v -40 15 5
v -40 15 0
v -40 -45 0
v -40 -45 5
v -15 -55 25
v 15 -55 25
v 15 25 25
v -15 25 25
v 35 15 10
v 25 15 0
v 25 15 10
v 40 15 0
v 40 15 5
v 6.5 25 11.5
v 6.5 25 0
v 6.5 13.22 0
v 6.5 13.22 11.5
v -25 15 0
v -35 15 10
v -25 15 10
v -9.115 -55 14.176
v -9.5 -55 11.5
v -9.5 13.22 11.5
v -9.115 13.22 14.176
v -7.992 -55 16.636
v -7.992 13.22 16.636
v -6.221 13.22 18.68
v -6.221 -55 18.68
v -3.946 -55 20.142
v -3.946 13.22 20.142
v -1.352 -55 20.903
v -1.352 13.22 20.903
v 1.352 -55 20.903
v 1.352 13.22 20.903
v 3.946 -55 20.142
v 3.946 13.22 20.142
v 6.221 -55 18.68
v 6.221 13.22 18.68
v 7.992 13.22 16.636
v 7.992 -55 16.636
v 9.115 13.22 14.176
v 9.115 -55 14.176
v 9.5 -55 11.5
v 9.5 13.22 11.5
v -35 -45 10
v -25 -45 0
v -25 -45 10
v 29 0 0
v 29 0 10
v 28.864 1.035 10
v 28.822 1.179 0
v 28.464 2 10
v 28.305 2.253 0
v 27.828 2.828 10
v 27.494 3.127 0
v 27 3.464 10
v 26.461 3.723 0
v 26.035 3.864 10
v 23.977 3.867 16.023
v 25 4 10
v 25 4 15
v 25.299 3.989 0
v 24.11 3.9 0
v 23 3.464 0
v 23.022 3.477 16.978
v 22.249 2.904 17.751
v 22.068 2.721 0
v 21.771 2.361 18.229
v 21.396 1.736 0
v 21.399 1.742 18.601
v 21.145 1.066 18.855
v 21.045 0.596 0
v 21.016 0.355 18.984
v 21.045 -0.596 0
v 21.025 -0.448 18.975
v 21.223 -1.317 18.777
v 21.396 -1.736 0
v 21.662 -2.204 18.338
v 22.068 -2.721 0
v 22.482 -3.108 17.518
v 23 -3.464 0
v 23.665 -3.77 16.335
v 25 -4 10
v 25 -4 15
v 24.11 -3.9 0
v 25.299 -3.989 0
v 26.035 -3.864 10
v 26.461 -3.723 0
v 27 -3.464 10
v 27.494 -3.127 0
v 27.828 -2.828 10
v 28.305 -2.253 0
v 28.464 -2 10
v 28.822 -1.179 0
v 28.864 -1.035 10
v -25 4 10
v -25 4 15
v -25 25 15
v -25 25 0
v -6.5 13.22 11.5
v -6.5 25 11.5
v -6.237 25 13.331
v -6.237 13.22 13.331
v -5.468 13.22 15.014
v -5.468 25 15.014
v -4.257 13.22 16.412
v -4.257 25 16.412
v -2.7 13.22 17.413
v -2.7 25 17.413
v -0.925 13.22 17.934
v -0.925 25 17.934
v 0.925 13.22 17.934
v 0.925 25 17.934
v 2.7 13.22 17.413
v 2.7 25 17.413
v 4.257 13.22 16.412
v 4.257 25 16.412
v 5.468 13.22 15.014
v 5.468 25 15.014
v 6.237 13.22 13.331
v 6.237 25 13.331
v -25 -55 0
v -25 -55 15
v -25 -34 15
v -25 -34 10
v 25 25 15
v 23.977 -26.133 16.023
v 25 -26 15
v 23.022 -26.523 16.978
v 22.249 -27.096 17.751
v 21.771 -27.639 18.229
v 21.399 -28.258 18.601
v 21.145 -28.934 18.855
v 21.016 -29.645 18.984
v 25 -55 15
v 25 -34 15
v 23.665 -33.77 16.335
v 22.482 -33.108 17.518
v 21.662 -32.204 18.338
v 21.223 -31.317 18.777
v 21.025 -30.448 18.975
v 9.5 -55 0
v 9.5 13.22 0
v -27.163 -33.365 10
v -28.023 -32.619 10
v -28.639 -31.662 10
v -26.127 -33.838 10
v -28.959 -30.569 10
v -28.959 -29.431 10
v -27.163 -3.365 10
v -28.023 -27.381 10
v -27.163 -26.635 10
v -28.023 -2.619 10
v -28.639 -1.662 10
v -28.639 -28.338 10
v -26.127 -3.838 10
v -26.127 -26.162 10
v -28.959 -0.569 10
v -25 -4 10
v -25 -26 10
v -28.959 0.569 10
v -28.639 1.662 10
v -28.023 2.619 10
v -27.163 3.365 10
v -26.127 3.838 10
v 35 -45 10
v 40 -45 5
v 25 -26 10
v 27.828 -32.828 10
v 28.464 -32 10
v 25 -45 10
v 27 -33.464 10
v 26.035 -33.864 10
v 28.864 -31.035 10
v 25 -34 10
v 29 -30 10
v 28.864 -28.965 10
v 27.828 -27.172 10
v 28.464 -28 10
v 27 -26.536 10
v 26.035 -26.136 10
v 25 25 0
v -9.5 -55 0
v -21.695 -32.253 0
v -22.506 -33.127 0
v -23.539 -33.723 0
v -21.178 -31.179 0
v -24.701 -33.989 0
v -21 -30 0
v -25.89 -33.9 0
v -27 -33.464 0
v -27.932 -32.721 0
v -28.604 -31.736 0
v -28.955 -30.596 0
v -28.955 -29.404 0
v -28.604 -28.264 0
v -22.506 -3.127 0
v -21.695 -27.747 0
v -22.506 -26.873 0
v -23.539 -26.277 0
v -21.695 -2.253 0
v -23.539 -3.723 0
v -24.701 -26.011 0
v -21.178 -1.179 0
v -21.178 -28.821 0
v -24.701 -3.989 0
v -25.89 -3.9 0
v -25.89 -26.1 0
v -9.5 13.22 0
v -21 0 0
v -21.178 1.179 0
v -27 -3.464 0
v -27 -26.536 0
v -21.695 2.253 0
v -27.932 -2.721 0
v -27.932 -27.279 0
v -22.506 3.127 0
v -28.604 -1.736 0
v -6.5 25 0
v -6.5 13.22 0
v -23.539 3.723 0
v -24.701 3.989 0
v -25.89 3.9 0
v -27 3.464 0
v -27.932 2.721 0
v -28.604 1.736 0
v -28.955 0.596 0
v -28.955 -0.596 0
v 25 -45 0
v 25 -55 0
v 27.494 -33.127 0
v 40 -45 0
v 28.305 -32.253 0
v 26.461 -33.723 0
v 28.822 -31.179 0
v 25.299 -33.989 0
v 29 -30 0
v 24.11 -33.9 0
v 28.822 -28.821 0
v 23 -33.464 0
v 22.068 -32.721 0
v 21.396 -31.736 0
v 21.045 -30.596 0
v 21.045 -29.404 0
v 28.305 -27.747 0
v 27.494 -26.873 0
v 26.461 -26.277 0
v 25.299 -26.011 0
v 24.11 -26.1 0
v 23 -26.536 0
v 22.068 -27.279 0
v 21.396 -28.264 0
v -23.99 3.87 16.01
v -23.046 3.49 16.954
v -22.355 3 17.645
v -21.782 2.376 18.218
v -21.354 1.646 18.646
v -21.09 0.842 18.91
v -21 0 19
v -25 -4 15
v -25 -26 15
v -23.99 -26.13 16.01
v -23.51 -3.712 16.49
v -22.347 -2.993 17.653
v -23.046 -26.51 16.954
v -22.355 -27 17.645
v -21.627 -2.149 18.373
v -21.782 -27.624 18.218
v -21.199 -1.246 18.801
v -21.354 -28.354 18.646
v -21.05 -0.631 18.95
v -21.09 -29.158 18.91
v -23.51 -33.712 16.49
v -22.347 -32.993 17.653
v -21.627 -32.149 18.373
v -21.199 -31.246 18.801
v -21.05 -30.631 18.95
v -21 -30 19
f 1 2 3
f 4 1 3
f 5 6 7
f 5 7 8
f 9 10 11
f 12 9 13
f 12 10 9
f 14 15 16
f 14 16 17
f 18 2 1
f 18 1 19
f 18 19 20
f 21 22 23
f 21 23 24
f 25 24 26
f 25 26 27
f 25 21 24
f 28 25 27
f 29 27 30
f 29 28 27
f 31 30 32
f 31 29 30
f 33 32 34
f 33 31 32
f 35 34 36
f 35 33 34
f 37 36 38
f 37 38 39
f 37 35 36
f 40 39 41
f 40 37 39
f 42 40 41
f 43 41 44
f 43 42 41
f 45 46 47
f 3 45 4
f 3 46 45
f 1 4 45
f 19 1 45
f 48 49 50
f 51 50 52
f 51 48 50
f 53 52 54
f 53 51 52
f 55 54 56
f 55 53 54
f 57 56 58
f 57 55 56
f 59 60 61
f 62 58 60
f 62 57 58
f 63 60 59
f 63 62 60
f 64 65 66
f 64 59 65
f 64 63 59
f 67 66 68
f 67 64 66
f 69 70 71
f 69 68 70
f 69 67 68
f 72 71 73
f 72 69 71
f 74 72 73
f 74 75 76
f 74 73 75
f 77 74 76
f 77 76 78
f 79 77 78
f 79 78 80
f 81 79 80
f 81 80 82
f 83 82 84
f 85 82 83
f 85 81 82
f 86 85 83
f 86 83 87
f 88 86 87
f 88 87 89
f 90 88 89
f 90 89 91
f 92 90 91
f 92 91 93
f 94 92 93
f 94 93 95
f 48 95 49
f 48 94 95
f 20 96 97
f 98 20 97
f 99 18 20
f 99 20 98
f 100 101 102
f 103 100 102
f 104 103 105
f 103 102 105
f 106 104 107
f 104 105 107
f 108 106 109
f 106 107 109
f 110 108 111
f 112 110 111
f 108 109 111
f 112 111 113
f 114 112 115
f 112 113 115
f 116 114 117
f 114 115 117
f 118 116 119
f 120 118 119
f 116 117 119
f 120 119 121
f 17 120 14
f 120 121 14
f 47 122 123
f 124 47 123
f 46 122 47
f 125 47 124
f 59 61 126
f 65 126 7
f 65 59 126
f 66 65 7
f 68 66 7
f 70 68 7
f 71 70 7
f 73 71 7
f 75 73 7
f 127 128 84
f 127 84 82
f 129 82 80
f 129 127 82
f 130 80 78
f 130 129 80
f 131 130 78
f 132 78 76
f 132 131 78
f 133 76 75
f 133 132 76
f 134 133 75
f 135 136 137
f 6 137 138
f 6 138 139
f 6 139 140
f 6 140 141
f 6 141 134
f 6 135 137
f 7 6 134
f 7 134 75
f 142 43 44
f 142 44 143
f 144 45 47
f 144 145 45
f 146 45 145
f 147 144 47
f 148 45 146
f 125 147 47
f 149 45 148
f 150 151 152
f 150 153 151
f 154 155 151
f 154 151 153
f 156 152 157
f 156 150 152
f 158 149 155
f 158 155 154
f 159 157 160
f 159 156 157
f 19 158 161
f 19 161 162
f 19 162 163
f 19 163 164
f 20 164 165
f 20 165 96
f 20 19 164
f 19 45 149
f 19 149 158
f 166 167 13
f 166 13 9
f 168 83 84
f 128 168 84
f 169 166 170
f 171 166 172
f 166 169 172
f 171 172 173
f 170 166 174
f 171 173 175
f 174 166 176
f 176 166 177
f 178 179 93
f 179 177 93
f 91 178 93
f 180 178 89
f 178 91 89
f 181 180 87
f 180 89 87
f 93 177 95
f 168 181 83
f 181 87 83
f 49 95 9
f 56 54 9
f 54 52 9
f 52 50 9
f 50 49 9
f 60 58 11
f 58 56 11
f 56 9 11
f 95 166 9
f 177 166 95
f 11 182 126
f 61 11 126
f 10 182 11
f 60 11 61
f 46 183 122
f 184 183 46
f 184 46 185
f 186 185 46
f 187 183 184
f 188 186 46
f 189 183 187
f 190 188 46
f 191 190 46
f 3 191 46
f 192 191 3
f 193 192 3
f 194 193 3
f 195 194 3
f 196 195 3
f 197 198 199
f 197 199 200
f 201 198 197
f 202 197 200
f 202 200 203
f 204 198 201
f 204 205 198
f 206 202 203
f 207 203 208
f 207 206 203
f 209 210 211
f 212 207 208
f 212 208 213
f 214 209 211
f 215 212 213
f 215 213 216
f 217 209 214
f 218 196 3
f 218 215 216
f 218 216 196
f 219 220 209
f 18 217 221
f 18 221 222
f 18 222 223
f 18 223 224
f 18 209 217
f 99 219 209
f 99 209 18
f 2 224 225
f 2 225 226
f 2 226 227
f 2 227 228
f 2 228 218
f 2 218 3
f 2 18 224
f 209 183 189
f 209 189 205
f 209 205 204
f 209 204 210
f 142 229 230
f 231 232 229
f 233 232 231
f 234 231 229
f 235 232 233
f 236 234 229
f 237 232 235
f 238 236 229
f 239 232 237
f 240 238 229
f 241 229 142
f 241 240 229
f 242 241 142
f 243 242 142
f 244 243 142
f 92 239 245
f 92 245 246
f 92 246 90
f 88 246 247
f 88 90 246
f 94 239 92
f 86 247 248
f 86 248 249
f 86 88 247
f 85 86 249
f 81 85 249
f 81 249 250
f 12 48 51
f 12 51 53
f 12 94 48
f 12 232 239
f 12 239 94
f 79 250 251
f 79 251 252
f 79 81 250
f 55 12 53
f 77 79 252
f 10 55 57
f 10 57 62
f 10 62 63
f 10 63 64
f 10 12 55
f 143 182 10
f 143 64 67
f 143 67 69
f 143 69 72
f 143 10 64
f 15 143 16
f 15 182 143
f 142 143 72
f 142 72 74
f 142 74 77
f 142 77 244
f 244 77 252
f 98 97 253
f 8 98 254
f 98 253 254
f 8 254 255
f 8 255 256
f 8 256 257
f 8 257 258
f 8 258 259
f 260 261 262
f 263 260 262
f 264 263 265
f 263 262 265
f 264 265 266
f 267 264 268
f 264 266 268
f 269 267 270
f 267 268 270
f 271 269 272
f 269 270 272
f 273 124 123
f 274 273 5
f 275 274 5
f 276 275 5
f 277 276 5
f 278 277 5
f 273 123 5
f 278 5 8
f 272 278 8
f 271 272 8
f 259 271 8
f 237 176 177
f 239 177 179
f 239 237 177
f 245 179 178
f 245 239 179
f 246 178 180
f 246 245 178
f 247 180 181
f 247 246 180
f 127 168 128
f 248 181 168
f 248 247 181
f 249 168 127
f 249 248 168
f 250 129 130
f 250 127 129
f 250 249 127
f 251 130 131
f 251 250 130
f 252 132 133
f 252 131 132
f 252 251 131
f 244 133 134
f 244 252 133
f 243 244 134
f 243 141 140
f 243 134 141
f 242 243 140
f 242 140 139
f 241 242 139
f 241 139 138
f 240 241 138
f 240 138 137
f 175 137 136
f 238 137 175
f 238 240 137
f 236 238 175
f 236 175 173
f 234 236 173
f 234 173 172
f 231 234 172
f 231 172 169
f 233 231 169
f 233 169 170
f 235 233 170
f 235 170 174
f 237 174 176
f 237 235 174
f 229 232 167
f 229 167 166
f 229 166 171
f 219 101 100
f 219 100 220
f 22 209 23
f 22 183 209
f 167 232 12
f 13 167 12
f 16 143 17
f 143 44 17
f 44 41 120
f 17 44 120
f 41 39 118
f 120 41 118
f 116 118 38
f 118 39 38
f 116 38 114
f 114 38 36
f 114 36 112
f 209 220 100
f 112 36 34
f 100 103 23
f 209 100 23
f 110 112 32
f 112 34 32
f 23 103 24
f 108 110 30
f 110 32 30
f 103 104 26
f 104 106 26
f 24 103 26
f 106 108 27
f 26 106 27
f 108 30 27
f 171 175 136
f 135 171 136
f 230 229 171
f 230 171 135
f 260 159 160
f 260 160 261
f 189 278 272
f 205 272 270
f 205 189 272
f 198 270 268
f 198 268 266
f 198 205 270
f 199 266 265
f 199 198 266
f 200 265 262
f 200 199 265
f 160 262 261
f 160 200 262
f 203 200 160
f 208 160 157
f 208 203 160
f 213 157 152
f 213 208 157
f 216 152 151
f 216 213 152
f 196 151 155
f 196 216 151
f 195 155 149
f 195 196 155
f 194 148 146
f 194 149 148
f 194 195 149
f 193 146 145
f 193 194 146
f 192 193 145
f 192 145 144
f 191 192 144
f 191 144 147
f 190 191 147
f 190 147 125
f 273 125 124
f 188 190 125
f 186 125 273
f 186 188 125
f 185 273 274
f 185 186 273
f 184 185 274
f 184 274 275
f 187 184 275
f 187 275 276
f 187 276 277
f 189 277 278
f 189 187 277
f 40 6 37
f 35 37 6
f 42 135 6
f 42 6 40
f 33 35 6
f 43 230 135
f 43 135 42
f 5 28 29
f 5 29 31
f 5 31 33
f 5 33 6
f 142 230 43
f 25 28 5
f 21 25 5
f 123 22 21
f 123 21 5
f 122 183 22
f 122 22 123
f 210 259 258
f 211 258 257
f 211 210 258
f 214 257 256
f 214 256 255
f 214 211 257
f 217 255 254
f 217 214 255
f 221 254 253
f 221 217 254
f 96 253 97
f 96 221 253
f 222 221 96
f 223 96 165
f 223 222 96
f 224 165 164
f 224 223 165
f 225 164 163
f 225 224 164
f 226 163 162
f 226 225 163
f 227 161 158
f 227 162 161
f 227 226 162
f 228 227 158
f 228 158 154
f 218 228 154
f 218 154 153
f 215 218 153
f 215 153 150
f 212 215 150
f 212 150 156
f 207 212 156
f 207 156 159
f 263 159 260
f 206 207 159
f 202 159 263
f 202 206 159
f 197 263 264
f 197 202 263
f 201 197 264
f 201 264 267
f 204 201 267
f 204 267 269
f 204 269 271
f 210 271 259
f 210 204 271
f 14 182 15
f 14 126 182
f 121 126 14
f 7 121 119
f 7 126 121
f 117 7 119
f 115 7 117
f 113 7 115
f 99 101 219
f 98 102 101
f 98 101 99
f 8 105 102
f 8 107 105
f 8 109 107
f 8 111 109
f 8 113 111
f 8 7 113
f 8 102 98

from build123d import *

# Parameters (mm, degrees)
SKETCH_R          = 4
PAD_DEPTH         = 25
POCKET_DEPTH      = 70.001
POCKET_DEPTH_BACK = 10.001
PAD001_DEPTH      = 11.78


with BuildPart() as part:
    # Sketch → Pad (new body)
    with BuildSketch(Plane.XY):
        Polygon((40, 15), (40, -15), (40, -45), (25, -45), (25, -55), (-25, -55), (-25, -45), (-40, -45), (-40, -15), (-40, 15), (-25, 15), (-25, 25), (25, 25), (25, 15), align=None)
        with Locations((-25, 0)):
            Circle(SKETCH_R, mode=Mode.SUBTRACT)
        with Locations((25, 0)):
            Circle(SKETCH_R, mode=Mode.SUBTRACT)
        with Locations((-25, -30)):
            Circle(SKETCH_R, mode=Mode.SUBTRACT)
        with Locations((25, -30)):
            Circle(SKETCH_R, mode=Mode.SUBTRACT)
    extrude(amount=PAD_DEPTH)

    # Sketch001 → Pocket (cut, two sides)
    with BuildSketch(Plane(origin=(0, 15, 0), x_dir=(-1, 0, 0), z_dir=(0, 1, 0))) as pocket_sk:
        with BuildLine():
            ThreePointArc((9.5, 11.5), (0, 21), (-9.5, 11.5))
            Line((-9.5, 11.5), (-9.5, 0))
            Line((-9.5, 0), (0, 0))
            Line((0, 0), (9.5, 0))
            Line((9.5, 0), (9.5, 11.5))
        make_face()
        Polygon((-40, 5), (-35, 10), (-25, 10), (-25, 15), (-15, 25), (-40, 25), align=None)
        Polygon((40, 5), (35, 10), (25, 10), (25, 15), (15, 25), (40, 25), align=None)
    extrude(amount=-POCKET_DEPTH, mode=Mode.SUBTRACT)
    extrude(pocket_sk.sketch, amount=POCKET_DEPTH_BACK, mode=Mode.SUBTRACT)

    # Sketch002 → Pad001 (new body)
    with BuildSketch(Plane(origin=(0, 25, 0), x_dir=(-1, 0, 0), z_dir=(0, 1, 0))):
        with BuildLine():
            Line((-9.5, 0), (-6.5, 0))
            Line((-6.5, 0), (-6.5, 11.5))
            ThreePointArc((6.5, 11.5), (0, 18), (-6.5, 11.5))
            Line((6.5, 11.5), (6.5, 0))
            Line((6.5, 0), (9.5, 0))
            Line((9.5, 0), (9.5, 11.5))
            ThreePointArc((9.5, 11.5), (0, 21), (-9.5, 11.5))
            Line((-9.5, 11.5), (-9.5, 0))
        make_face()
    extrude(amount=-PAD001_DEPTH)


solid = part.part
